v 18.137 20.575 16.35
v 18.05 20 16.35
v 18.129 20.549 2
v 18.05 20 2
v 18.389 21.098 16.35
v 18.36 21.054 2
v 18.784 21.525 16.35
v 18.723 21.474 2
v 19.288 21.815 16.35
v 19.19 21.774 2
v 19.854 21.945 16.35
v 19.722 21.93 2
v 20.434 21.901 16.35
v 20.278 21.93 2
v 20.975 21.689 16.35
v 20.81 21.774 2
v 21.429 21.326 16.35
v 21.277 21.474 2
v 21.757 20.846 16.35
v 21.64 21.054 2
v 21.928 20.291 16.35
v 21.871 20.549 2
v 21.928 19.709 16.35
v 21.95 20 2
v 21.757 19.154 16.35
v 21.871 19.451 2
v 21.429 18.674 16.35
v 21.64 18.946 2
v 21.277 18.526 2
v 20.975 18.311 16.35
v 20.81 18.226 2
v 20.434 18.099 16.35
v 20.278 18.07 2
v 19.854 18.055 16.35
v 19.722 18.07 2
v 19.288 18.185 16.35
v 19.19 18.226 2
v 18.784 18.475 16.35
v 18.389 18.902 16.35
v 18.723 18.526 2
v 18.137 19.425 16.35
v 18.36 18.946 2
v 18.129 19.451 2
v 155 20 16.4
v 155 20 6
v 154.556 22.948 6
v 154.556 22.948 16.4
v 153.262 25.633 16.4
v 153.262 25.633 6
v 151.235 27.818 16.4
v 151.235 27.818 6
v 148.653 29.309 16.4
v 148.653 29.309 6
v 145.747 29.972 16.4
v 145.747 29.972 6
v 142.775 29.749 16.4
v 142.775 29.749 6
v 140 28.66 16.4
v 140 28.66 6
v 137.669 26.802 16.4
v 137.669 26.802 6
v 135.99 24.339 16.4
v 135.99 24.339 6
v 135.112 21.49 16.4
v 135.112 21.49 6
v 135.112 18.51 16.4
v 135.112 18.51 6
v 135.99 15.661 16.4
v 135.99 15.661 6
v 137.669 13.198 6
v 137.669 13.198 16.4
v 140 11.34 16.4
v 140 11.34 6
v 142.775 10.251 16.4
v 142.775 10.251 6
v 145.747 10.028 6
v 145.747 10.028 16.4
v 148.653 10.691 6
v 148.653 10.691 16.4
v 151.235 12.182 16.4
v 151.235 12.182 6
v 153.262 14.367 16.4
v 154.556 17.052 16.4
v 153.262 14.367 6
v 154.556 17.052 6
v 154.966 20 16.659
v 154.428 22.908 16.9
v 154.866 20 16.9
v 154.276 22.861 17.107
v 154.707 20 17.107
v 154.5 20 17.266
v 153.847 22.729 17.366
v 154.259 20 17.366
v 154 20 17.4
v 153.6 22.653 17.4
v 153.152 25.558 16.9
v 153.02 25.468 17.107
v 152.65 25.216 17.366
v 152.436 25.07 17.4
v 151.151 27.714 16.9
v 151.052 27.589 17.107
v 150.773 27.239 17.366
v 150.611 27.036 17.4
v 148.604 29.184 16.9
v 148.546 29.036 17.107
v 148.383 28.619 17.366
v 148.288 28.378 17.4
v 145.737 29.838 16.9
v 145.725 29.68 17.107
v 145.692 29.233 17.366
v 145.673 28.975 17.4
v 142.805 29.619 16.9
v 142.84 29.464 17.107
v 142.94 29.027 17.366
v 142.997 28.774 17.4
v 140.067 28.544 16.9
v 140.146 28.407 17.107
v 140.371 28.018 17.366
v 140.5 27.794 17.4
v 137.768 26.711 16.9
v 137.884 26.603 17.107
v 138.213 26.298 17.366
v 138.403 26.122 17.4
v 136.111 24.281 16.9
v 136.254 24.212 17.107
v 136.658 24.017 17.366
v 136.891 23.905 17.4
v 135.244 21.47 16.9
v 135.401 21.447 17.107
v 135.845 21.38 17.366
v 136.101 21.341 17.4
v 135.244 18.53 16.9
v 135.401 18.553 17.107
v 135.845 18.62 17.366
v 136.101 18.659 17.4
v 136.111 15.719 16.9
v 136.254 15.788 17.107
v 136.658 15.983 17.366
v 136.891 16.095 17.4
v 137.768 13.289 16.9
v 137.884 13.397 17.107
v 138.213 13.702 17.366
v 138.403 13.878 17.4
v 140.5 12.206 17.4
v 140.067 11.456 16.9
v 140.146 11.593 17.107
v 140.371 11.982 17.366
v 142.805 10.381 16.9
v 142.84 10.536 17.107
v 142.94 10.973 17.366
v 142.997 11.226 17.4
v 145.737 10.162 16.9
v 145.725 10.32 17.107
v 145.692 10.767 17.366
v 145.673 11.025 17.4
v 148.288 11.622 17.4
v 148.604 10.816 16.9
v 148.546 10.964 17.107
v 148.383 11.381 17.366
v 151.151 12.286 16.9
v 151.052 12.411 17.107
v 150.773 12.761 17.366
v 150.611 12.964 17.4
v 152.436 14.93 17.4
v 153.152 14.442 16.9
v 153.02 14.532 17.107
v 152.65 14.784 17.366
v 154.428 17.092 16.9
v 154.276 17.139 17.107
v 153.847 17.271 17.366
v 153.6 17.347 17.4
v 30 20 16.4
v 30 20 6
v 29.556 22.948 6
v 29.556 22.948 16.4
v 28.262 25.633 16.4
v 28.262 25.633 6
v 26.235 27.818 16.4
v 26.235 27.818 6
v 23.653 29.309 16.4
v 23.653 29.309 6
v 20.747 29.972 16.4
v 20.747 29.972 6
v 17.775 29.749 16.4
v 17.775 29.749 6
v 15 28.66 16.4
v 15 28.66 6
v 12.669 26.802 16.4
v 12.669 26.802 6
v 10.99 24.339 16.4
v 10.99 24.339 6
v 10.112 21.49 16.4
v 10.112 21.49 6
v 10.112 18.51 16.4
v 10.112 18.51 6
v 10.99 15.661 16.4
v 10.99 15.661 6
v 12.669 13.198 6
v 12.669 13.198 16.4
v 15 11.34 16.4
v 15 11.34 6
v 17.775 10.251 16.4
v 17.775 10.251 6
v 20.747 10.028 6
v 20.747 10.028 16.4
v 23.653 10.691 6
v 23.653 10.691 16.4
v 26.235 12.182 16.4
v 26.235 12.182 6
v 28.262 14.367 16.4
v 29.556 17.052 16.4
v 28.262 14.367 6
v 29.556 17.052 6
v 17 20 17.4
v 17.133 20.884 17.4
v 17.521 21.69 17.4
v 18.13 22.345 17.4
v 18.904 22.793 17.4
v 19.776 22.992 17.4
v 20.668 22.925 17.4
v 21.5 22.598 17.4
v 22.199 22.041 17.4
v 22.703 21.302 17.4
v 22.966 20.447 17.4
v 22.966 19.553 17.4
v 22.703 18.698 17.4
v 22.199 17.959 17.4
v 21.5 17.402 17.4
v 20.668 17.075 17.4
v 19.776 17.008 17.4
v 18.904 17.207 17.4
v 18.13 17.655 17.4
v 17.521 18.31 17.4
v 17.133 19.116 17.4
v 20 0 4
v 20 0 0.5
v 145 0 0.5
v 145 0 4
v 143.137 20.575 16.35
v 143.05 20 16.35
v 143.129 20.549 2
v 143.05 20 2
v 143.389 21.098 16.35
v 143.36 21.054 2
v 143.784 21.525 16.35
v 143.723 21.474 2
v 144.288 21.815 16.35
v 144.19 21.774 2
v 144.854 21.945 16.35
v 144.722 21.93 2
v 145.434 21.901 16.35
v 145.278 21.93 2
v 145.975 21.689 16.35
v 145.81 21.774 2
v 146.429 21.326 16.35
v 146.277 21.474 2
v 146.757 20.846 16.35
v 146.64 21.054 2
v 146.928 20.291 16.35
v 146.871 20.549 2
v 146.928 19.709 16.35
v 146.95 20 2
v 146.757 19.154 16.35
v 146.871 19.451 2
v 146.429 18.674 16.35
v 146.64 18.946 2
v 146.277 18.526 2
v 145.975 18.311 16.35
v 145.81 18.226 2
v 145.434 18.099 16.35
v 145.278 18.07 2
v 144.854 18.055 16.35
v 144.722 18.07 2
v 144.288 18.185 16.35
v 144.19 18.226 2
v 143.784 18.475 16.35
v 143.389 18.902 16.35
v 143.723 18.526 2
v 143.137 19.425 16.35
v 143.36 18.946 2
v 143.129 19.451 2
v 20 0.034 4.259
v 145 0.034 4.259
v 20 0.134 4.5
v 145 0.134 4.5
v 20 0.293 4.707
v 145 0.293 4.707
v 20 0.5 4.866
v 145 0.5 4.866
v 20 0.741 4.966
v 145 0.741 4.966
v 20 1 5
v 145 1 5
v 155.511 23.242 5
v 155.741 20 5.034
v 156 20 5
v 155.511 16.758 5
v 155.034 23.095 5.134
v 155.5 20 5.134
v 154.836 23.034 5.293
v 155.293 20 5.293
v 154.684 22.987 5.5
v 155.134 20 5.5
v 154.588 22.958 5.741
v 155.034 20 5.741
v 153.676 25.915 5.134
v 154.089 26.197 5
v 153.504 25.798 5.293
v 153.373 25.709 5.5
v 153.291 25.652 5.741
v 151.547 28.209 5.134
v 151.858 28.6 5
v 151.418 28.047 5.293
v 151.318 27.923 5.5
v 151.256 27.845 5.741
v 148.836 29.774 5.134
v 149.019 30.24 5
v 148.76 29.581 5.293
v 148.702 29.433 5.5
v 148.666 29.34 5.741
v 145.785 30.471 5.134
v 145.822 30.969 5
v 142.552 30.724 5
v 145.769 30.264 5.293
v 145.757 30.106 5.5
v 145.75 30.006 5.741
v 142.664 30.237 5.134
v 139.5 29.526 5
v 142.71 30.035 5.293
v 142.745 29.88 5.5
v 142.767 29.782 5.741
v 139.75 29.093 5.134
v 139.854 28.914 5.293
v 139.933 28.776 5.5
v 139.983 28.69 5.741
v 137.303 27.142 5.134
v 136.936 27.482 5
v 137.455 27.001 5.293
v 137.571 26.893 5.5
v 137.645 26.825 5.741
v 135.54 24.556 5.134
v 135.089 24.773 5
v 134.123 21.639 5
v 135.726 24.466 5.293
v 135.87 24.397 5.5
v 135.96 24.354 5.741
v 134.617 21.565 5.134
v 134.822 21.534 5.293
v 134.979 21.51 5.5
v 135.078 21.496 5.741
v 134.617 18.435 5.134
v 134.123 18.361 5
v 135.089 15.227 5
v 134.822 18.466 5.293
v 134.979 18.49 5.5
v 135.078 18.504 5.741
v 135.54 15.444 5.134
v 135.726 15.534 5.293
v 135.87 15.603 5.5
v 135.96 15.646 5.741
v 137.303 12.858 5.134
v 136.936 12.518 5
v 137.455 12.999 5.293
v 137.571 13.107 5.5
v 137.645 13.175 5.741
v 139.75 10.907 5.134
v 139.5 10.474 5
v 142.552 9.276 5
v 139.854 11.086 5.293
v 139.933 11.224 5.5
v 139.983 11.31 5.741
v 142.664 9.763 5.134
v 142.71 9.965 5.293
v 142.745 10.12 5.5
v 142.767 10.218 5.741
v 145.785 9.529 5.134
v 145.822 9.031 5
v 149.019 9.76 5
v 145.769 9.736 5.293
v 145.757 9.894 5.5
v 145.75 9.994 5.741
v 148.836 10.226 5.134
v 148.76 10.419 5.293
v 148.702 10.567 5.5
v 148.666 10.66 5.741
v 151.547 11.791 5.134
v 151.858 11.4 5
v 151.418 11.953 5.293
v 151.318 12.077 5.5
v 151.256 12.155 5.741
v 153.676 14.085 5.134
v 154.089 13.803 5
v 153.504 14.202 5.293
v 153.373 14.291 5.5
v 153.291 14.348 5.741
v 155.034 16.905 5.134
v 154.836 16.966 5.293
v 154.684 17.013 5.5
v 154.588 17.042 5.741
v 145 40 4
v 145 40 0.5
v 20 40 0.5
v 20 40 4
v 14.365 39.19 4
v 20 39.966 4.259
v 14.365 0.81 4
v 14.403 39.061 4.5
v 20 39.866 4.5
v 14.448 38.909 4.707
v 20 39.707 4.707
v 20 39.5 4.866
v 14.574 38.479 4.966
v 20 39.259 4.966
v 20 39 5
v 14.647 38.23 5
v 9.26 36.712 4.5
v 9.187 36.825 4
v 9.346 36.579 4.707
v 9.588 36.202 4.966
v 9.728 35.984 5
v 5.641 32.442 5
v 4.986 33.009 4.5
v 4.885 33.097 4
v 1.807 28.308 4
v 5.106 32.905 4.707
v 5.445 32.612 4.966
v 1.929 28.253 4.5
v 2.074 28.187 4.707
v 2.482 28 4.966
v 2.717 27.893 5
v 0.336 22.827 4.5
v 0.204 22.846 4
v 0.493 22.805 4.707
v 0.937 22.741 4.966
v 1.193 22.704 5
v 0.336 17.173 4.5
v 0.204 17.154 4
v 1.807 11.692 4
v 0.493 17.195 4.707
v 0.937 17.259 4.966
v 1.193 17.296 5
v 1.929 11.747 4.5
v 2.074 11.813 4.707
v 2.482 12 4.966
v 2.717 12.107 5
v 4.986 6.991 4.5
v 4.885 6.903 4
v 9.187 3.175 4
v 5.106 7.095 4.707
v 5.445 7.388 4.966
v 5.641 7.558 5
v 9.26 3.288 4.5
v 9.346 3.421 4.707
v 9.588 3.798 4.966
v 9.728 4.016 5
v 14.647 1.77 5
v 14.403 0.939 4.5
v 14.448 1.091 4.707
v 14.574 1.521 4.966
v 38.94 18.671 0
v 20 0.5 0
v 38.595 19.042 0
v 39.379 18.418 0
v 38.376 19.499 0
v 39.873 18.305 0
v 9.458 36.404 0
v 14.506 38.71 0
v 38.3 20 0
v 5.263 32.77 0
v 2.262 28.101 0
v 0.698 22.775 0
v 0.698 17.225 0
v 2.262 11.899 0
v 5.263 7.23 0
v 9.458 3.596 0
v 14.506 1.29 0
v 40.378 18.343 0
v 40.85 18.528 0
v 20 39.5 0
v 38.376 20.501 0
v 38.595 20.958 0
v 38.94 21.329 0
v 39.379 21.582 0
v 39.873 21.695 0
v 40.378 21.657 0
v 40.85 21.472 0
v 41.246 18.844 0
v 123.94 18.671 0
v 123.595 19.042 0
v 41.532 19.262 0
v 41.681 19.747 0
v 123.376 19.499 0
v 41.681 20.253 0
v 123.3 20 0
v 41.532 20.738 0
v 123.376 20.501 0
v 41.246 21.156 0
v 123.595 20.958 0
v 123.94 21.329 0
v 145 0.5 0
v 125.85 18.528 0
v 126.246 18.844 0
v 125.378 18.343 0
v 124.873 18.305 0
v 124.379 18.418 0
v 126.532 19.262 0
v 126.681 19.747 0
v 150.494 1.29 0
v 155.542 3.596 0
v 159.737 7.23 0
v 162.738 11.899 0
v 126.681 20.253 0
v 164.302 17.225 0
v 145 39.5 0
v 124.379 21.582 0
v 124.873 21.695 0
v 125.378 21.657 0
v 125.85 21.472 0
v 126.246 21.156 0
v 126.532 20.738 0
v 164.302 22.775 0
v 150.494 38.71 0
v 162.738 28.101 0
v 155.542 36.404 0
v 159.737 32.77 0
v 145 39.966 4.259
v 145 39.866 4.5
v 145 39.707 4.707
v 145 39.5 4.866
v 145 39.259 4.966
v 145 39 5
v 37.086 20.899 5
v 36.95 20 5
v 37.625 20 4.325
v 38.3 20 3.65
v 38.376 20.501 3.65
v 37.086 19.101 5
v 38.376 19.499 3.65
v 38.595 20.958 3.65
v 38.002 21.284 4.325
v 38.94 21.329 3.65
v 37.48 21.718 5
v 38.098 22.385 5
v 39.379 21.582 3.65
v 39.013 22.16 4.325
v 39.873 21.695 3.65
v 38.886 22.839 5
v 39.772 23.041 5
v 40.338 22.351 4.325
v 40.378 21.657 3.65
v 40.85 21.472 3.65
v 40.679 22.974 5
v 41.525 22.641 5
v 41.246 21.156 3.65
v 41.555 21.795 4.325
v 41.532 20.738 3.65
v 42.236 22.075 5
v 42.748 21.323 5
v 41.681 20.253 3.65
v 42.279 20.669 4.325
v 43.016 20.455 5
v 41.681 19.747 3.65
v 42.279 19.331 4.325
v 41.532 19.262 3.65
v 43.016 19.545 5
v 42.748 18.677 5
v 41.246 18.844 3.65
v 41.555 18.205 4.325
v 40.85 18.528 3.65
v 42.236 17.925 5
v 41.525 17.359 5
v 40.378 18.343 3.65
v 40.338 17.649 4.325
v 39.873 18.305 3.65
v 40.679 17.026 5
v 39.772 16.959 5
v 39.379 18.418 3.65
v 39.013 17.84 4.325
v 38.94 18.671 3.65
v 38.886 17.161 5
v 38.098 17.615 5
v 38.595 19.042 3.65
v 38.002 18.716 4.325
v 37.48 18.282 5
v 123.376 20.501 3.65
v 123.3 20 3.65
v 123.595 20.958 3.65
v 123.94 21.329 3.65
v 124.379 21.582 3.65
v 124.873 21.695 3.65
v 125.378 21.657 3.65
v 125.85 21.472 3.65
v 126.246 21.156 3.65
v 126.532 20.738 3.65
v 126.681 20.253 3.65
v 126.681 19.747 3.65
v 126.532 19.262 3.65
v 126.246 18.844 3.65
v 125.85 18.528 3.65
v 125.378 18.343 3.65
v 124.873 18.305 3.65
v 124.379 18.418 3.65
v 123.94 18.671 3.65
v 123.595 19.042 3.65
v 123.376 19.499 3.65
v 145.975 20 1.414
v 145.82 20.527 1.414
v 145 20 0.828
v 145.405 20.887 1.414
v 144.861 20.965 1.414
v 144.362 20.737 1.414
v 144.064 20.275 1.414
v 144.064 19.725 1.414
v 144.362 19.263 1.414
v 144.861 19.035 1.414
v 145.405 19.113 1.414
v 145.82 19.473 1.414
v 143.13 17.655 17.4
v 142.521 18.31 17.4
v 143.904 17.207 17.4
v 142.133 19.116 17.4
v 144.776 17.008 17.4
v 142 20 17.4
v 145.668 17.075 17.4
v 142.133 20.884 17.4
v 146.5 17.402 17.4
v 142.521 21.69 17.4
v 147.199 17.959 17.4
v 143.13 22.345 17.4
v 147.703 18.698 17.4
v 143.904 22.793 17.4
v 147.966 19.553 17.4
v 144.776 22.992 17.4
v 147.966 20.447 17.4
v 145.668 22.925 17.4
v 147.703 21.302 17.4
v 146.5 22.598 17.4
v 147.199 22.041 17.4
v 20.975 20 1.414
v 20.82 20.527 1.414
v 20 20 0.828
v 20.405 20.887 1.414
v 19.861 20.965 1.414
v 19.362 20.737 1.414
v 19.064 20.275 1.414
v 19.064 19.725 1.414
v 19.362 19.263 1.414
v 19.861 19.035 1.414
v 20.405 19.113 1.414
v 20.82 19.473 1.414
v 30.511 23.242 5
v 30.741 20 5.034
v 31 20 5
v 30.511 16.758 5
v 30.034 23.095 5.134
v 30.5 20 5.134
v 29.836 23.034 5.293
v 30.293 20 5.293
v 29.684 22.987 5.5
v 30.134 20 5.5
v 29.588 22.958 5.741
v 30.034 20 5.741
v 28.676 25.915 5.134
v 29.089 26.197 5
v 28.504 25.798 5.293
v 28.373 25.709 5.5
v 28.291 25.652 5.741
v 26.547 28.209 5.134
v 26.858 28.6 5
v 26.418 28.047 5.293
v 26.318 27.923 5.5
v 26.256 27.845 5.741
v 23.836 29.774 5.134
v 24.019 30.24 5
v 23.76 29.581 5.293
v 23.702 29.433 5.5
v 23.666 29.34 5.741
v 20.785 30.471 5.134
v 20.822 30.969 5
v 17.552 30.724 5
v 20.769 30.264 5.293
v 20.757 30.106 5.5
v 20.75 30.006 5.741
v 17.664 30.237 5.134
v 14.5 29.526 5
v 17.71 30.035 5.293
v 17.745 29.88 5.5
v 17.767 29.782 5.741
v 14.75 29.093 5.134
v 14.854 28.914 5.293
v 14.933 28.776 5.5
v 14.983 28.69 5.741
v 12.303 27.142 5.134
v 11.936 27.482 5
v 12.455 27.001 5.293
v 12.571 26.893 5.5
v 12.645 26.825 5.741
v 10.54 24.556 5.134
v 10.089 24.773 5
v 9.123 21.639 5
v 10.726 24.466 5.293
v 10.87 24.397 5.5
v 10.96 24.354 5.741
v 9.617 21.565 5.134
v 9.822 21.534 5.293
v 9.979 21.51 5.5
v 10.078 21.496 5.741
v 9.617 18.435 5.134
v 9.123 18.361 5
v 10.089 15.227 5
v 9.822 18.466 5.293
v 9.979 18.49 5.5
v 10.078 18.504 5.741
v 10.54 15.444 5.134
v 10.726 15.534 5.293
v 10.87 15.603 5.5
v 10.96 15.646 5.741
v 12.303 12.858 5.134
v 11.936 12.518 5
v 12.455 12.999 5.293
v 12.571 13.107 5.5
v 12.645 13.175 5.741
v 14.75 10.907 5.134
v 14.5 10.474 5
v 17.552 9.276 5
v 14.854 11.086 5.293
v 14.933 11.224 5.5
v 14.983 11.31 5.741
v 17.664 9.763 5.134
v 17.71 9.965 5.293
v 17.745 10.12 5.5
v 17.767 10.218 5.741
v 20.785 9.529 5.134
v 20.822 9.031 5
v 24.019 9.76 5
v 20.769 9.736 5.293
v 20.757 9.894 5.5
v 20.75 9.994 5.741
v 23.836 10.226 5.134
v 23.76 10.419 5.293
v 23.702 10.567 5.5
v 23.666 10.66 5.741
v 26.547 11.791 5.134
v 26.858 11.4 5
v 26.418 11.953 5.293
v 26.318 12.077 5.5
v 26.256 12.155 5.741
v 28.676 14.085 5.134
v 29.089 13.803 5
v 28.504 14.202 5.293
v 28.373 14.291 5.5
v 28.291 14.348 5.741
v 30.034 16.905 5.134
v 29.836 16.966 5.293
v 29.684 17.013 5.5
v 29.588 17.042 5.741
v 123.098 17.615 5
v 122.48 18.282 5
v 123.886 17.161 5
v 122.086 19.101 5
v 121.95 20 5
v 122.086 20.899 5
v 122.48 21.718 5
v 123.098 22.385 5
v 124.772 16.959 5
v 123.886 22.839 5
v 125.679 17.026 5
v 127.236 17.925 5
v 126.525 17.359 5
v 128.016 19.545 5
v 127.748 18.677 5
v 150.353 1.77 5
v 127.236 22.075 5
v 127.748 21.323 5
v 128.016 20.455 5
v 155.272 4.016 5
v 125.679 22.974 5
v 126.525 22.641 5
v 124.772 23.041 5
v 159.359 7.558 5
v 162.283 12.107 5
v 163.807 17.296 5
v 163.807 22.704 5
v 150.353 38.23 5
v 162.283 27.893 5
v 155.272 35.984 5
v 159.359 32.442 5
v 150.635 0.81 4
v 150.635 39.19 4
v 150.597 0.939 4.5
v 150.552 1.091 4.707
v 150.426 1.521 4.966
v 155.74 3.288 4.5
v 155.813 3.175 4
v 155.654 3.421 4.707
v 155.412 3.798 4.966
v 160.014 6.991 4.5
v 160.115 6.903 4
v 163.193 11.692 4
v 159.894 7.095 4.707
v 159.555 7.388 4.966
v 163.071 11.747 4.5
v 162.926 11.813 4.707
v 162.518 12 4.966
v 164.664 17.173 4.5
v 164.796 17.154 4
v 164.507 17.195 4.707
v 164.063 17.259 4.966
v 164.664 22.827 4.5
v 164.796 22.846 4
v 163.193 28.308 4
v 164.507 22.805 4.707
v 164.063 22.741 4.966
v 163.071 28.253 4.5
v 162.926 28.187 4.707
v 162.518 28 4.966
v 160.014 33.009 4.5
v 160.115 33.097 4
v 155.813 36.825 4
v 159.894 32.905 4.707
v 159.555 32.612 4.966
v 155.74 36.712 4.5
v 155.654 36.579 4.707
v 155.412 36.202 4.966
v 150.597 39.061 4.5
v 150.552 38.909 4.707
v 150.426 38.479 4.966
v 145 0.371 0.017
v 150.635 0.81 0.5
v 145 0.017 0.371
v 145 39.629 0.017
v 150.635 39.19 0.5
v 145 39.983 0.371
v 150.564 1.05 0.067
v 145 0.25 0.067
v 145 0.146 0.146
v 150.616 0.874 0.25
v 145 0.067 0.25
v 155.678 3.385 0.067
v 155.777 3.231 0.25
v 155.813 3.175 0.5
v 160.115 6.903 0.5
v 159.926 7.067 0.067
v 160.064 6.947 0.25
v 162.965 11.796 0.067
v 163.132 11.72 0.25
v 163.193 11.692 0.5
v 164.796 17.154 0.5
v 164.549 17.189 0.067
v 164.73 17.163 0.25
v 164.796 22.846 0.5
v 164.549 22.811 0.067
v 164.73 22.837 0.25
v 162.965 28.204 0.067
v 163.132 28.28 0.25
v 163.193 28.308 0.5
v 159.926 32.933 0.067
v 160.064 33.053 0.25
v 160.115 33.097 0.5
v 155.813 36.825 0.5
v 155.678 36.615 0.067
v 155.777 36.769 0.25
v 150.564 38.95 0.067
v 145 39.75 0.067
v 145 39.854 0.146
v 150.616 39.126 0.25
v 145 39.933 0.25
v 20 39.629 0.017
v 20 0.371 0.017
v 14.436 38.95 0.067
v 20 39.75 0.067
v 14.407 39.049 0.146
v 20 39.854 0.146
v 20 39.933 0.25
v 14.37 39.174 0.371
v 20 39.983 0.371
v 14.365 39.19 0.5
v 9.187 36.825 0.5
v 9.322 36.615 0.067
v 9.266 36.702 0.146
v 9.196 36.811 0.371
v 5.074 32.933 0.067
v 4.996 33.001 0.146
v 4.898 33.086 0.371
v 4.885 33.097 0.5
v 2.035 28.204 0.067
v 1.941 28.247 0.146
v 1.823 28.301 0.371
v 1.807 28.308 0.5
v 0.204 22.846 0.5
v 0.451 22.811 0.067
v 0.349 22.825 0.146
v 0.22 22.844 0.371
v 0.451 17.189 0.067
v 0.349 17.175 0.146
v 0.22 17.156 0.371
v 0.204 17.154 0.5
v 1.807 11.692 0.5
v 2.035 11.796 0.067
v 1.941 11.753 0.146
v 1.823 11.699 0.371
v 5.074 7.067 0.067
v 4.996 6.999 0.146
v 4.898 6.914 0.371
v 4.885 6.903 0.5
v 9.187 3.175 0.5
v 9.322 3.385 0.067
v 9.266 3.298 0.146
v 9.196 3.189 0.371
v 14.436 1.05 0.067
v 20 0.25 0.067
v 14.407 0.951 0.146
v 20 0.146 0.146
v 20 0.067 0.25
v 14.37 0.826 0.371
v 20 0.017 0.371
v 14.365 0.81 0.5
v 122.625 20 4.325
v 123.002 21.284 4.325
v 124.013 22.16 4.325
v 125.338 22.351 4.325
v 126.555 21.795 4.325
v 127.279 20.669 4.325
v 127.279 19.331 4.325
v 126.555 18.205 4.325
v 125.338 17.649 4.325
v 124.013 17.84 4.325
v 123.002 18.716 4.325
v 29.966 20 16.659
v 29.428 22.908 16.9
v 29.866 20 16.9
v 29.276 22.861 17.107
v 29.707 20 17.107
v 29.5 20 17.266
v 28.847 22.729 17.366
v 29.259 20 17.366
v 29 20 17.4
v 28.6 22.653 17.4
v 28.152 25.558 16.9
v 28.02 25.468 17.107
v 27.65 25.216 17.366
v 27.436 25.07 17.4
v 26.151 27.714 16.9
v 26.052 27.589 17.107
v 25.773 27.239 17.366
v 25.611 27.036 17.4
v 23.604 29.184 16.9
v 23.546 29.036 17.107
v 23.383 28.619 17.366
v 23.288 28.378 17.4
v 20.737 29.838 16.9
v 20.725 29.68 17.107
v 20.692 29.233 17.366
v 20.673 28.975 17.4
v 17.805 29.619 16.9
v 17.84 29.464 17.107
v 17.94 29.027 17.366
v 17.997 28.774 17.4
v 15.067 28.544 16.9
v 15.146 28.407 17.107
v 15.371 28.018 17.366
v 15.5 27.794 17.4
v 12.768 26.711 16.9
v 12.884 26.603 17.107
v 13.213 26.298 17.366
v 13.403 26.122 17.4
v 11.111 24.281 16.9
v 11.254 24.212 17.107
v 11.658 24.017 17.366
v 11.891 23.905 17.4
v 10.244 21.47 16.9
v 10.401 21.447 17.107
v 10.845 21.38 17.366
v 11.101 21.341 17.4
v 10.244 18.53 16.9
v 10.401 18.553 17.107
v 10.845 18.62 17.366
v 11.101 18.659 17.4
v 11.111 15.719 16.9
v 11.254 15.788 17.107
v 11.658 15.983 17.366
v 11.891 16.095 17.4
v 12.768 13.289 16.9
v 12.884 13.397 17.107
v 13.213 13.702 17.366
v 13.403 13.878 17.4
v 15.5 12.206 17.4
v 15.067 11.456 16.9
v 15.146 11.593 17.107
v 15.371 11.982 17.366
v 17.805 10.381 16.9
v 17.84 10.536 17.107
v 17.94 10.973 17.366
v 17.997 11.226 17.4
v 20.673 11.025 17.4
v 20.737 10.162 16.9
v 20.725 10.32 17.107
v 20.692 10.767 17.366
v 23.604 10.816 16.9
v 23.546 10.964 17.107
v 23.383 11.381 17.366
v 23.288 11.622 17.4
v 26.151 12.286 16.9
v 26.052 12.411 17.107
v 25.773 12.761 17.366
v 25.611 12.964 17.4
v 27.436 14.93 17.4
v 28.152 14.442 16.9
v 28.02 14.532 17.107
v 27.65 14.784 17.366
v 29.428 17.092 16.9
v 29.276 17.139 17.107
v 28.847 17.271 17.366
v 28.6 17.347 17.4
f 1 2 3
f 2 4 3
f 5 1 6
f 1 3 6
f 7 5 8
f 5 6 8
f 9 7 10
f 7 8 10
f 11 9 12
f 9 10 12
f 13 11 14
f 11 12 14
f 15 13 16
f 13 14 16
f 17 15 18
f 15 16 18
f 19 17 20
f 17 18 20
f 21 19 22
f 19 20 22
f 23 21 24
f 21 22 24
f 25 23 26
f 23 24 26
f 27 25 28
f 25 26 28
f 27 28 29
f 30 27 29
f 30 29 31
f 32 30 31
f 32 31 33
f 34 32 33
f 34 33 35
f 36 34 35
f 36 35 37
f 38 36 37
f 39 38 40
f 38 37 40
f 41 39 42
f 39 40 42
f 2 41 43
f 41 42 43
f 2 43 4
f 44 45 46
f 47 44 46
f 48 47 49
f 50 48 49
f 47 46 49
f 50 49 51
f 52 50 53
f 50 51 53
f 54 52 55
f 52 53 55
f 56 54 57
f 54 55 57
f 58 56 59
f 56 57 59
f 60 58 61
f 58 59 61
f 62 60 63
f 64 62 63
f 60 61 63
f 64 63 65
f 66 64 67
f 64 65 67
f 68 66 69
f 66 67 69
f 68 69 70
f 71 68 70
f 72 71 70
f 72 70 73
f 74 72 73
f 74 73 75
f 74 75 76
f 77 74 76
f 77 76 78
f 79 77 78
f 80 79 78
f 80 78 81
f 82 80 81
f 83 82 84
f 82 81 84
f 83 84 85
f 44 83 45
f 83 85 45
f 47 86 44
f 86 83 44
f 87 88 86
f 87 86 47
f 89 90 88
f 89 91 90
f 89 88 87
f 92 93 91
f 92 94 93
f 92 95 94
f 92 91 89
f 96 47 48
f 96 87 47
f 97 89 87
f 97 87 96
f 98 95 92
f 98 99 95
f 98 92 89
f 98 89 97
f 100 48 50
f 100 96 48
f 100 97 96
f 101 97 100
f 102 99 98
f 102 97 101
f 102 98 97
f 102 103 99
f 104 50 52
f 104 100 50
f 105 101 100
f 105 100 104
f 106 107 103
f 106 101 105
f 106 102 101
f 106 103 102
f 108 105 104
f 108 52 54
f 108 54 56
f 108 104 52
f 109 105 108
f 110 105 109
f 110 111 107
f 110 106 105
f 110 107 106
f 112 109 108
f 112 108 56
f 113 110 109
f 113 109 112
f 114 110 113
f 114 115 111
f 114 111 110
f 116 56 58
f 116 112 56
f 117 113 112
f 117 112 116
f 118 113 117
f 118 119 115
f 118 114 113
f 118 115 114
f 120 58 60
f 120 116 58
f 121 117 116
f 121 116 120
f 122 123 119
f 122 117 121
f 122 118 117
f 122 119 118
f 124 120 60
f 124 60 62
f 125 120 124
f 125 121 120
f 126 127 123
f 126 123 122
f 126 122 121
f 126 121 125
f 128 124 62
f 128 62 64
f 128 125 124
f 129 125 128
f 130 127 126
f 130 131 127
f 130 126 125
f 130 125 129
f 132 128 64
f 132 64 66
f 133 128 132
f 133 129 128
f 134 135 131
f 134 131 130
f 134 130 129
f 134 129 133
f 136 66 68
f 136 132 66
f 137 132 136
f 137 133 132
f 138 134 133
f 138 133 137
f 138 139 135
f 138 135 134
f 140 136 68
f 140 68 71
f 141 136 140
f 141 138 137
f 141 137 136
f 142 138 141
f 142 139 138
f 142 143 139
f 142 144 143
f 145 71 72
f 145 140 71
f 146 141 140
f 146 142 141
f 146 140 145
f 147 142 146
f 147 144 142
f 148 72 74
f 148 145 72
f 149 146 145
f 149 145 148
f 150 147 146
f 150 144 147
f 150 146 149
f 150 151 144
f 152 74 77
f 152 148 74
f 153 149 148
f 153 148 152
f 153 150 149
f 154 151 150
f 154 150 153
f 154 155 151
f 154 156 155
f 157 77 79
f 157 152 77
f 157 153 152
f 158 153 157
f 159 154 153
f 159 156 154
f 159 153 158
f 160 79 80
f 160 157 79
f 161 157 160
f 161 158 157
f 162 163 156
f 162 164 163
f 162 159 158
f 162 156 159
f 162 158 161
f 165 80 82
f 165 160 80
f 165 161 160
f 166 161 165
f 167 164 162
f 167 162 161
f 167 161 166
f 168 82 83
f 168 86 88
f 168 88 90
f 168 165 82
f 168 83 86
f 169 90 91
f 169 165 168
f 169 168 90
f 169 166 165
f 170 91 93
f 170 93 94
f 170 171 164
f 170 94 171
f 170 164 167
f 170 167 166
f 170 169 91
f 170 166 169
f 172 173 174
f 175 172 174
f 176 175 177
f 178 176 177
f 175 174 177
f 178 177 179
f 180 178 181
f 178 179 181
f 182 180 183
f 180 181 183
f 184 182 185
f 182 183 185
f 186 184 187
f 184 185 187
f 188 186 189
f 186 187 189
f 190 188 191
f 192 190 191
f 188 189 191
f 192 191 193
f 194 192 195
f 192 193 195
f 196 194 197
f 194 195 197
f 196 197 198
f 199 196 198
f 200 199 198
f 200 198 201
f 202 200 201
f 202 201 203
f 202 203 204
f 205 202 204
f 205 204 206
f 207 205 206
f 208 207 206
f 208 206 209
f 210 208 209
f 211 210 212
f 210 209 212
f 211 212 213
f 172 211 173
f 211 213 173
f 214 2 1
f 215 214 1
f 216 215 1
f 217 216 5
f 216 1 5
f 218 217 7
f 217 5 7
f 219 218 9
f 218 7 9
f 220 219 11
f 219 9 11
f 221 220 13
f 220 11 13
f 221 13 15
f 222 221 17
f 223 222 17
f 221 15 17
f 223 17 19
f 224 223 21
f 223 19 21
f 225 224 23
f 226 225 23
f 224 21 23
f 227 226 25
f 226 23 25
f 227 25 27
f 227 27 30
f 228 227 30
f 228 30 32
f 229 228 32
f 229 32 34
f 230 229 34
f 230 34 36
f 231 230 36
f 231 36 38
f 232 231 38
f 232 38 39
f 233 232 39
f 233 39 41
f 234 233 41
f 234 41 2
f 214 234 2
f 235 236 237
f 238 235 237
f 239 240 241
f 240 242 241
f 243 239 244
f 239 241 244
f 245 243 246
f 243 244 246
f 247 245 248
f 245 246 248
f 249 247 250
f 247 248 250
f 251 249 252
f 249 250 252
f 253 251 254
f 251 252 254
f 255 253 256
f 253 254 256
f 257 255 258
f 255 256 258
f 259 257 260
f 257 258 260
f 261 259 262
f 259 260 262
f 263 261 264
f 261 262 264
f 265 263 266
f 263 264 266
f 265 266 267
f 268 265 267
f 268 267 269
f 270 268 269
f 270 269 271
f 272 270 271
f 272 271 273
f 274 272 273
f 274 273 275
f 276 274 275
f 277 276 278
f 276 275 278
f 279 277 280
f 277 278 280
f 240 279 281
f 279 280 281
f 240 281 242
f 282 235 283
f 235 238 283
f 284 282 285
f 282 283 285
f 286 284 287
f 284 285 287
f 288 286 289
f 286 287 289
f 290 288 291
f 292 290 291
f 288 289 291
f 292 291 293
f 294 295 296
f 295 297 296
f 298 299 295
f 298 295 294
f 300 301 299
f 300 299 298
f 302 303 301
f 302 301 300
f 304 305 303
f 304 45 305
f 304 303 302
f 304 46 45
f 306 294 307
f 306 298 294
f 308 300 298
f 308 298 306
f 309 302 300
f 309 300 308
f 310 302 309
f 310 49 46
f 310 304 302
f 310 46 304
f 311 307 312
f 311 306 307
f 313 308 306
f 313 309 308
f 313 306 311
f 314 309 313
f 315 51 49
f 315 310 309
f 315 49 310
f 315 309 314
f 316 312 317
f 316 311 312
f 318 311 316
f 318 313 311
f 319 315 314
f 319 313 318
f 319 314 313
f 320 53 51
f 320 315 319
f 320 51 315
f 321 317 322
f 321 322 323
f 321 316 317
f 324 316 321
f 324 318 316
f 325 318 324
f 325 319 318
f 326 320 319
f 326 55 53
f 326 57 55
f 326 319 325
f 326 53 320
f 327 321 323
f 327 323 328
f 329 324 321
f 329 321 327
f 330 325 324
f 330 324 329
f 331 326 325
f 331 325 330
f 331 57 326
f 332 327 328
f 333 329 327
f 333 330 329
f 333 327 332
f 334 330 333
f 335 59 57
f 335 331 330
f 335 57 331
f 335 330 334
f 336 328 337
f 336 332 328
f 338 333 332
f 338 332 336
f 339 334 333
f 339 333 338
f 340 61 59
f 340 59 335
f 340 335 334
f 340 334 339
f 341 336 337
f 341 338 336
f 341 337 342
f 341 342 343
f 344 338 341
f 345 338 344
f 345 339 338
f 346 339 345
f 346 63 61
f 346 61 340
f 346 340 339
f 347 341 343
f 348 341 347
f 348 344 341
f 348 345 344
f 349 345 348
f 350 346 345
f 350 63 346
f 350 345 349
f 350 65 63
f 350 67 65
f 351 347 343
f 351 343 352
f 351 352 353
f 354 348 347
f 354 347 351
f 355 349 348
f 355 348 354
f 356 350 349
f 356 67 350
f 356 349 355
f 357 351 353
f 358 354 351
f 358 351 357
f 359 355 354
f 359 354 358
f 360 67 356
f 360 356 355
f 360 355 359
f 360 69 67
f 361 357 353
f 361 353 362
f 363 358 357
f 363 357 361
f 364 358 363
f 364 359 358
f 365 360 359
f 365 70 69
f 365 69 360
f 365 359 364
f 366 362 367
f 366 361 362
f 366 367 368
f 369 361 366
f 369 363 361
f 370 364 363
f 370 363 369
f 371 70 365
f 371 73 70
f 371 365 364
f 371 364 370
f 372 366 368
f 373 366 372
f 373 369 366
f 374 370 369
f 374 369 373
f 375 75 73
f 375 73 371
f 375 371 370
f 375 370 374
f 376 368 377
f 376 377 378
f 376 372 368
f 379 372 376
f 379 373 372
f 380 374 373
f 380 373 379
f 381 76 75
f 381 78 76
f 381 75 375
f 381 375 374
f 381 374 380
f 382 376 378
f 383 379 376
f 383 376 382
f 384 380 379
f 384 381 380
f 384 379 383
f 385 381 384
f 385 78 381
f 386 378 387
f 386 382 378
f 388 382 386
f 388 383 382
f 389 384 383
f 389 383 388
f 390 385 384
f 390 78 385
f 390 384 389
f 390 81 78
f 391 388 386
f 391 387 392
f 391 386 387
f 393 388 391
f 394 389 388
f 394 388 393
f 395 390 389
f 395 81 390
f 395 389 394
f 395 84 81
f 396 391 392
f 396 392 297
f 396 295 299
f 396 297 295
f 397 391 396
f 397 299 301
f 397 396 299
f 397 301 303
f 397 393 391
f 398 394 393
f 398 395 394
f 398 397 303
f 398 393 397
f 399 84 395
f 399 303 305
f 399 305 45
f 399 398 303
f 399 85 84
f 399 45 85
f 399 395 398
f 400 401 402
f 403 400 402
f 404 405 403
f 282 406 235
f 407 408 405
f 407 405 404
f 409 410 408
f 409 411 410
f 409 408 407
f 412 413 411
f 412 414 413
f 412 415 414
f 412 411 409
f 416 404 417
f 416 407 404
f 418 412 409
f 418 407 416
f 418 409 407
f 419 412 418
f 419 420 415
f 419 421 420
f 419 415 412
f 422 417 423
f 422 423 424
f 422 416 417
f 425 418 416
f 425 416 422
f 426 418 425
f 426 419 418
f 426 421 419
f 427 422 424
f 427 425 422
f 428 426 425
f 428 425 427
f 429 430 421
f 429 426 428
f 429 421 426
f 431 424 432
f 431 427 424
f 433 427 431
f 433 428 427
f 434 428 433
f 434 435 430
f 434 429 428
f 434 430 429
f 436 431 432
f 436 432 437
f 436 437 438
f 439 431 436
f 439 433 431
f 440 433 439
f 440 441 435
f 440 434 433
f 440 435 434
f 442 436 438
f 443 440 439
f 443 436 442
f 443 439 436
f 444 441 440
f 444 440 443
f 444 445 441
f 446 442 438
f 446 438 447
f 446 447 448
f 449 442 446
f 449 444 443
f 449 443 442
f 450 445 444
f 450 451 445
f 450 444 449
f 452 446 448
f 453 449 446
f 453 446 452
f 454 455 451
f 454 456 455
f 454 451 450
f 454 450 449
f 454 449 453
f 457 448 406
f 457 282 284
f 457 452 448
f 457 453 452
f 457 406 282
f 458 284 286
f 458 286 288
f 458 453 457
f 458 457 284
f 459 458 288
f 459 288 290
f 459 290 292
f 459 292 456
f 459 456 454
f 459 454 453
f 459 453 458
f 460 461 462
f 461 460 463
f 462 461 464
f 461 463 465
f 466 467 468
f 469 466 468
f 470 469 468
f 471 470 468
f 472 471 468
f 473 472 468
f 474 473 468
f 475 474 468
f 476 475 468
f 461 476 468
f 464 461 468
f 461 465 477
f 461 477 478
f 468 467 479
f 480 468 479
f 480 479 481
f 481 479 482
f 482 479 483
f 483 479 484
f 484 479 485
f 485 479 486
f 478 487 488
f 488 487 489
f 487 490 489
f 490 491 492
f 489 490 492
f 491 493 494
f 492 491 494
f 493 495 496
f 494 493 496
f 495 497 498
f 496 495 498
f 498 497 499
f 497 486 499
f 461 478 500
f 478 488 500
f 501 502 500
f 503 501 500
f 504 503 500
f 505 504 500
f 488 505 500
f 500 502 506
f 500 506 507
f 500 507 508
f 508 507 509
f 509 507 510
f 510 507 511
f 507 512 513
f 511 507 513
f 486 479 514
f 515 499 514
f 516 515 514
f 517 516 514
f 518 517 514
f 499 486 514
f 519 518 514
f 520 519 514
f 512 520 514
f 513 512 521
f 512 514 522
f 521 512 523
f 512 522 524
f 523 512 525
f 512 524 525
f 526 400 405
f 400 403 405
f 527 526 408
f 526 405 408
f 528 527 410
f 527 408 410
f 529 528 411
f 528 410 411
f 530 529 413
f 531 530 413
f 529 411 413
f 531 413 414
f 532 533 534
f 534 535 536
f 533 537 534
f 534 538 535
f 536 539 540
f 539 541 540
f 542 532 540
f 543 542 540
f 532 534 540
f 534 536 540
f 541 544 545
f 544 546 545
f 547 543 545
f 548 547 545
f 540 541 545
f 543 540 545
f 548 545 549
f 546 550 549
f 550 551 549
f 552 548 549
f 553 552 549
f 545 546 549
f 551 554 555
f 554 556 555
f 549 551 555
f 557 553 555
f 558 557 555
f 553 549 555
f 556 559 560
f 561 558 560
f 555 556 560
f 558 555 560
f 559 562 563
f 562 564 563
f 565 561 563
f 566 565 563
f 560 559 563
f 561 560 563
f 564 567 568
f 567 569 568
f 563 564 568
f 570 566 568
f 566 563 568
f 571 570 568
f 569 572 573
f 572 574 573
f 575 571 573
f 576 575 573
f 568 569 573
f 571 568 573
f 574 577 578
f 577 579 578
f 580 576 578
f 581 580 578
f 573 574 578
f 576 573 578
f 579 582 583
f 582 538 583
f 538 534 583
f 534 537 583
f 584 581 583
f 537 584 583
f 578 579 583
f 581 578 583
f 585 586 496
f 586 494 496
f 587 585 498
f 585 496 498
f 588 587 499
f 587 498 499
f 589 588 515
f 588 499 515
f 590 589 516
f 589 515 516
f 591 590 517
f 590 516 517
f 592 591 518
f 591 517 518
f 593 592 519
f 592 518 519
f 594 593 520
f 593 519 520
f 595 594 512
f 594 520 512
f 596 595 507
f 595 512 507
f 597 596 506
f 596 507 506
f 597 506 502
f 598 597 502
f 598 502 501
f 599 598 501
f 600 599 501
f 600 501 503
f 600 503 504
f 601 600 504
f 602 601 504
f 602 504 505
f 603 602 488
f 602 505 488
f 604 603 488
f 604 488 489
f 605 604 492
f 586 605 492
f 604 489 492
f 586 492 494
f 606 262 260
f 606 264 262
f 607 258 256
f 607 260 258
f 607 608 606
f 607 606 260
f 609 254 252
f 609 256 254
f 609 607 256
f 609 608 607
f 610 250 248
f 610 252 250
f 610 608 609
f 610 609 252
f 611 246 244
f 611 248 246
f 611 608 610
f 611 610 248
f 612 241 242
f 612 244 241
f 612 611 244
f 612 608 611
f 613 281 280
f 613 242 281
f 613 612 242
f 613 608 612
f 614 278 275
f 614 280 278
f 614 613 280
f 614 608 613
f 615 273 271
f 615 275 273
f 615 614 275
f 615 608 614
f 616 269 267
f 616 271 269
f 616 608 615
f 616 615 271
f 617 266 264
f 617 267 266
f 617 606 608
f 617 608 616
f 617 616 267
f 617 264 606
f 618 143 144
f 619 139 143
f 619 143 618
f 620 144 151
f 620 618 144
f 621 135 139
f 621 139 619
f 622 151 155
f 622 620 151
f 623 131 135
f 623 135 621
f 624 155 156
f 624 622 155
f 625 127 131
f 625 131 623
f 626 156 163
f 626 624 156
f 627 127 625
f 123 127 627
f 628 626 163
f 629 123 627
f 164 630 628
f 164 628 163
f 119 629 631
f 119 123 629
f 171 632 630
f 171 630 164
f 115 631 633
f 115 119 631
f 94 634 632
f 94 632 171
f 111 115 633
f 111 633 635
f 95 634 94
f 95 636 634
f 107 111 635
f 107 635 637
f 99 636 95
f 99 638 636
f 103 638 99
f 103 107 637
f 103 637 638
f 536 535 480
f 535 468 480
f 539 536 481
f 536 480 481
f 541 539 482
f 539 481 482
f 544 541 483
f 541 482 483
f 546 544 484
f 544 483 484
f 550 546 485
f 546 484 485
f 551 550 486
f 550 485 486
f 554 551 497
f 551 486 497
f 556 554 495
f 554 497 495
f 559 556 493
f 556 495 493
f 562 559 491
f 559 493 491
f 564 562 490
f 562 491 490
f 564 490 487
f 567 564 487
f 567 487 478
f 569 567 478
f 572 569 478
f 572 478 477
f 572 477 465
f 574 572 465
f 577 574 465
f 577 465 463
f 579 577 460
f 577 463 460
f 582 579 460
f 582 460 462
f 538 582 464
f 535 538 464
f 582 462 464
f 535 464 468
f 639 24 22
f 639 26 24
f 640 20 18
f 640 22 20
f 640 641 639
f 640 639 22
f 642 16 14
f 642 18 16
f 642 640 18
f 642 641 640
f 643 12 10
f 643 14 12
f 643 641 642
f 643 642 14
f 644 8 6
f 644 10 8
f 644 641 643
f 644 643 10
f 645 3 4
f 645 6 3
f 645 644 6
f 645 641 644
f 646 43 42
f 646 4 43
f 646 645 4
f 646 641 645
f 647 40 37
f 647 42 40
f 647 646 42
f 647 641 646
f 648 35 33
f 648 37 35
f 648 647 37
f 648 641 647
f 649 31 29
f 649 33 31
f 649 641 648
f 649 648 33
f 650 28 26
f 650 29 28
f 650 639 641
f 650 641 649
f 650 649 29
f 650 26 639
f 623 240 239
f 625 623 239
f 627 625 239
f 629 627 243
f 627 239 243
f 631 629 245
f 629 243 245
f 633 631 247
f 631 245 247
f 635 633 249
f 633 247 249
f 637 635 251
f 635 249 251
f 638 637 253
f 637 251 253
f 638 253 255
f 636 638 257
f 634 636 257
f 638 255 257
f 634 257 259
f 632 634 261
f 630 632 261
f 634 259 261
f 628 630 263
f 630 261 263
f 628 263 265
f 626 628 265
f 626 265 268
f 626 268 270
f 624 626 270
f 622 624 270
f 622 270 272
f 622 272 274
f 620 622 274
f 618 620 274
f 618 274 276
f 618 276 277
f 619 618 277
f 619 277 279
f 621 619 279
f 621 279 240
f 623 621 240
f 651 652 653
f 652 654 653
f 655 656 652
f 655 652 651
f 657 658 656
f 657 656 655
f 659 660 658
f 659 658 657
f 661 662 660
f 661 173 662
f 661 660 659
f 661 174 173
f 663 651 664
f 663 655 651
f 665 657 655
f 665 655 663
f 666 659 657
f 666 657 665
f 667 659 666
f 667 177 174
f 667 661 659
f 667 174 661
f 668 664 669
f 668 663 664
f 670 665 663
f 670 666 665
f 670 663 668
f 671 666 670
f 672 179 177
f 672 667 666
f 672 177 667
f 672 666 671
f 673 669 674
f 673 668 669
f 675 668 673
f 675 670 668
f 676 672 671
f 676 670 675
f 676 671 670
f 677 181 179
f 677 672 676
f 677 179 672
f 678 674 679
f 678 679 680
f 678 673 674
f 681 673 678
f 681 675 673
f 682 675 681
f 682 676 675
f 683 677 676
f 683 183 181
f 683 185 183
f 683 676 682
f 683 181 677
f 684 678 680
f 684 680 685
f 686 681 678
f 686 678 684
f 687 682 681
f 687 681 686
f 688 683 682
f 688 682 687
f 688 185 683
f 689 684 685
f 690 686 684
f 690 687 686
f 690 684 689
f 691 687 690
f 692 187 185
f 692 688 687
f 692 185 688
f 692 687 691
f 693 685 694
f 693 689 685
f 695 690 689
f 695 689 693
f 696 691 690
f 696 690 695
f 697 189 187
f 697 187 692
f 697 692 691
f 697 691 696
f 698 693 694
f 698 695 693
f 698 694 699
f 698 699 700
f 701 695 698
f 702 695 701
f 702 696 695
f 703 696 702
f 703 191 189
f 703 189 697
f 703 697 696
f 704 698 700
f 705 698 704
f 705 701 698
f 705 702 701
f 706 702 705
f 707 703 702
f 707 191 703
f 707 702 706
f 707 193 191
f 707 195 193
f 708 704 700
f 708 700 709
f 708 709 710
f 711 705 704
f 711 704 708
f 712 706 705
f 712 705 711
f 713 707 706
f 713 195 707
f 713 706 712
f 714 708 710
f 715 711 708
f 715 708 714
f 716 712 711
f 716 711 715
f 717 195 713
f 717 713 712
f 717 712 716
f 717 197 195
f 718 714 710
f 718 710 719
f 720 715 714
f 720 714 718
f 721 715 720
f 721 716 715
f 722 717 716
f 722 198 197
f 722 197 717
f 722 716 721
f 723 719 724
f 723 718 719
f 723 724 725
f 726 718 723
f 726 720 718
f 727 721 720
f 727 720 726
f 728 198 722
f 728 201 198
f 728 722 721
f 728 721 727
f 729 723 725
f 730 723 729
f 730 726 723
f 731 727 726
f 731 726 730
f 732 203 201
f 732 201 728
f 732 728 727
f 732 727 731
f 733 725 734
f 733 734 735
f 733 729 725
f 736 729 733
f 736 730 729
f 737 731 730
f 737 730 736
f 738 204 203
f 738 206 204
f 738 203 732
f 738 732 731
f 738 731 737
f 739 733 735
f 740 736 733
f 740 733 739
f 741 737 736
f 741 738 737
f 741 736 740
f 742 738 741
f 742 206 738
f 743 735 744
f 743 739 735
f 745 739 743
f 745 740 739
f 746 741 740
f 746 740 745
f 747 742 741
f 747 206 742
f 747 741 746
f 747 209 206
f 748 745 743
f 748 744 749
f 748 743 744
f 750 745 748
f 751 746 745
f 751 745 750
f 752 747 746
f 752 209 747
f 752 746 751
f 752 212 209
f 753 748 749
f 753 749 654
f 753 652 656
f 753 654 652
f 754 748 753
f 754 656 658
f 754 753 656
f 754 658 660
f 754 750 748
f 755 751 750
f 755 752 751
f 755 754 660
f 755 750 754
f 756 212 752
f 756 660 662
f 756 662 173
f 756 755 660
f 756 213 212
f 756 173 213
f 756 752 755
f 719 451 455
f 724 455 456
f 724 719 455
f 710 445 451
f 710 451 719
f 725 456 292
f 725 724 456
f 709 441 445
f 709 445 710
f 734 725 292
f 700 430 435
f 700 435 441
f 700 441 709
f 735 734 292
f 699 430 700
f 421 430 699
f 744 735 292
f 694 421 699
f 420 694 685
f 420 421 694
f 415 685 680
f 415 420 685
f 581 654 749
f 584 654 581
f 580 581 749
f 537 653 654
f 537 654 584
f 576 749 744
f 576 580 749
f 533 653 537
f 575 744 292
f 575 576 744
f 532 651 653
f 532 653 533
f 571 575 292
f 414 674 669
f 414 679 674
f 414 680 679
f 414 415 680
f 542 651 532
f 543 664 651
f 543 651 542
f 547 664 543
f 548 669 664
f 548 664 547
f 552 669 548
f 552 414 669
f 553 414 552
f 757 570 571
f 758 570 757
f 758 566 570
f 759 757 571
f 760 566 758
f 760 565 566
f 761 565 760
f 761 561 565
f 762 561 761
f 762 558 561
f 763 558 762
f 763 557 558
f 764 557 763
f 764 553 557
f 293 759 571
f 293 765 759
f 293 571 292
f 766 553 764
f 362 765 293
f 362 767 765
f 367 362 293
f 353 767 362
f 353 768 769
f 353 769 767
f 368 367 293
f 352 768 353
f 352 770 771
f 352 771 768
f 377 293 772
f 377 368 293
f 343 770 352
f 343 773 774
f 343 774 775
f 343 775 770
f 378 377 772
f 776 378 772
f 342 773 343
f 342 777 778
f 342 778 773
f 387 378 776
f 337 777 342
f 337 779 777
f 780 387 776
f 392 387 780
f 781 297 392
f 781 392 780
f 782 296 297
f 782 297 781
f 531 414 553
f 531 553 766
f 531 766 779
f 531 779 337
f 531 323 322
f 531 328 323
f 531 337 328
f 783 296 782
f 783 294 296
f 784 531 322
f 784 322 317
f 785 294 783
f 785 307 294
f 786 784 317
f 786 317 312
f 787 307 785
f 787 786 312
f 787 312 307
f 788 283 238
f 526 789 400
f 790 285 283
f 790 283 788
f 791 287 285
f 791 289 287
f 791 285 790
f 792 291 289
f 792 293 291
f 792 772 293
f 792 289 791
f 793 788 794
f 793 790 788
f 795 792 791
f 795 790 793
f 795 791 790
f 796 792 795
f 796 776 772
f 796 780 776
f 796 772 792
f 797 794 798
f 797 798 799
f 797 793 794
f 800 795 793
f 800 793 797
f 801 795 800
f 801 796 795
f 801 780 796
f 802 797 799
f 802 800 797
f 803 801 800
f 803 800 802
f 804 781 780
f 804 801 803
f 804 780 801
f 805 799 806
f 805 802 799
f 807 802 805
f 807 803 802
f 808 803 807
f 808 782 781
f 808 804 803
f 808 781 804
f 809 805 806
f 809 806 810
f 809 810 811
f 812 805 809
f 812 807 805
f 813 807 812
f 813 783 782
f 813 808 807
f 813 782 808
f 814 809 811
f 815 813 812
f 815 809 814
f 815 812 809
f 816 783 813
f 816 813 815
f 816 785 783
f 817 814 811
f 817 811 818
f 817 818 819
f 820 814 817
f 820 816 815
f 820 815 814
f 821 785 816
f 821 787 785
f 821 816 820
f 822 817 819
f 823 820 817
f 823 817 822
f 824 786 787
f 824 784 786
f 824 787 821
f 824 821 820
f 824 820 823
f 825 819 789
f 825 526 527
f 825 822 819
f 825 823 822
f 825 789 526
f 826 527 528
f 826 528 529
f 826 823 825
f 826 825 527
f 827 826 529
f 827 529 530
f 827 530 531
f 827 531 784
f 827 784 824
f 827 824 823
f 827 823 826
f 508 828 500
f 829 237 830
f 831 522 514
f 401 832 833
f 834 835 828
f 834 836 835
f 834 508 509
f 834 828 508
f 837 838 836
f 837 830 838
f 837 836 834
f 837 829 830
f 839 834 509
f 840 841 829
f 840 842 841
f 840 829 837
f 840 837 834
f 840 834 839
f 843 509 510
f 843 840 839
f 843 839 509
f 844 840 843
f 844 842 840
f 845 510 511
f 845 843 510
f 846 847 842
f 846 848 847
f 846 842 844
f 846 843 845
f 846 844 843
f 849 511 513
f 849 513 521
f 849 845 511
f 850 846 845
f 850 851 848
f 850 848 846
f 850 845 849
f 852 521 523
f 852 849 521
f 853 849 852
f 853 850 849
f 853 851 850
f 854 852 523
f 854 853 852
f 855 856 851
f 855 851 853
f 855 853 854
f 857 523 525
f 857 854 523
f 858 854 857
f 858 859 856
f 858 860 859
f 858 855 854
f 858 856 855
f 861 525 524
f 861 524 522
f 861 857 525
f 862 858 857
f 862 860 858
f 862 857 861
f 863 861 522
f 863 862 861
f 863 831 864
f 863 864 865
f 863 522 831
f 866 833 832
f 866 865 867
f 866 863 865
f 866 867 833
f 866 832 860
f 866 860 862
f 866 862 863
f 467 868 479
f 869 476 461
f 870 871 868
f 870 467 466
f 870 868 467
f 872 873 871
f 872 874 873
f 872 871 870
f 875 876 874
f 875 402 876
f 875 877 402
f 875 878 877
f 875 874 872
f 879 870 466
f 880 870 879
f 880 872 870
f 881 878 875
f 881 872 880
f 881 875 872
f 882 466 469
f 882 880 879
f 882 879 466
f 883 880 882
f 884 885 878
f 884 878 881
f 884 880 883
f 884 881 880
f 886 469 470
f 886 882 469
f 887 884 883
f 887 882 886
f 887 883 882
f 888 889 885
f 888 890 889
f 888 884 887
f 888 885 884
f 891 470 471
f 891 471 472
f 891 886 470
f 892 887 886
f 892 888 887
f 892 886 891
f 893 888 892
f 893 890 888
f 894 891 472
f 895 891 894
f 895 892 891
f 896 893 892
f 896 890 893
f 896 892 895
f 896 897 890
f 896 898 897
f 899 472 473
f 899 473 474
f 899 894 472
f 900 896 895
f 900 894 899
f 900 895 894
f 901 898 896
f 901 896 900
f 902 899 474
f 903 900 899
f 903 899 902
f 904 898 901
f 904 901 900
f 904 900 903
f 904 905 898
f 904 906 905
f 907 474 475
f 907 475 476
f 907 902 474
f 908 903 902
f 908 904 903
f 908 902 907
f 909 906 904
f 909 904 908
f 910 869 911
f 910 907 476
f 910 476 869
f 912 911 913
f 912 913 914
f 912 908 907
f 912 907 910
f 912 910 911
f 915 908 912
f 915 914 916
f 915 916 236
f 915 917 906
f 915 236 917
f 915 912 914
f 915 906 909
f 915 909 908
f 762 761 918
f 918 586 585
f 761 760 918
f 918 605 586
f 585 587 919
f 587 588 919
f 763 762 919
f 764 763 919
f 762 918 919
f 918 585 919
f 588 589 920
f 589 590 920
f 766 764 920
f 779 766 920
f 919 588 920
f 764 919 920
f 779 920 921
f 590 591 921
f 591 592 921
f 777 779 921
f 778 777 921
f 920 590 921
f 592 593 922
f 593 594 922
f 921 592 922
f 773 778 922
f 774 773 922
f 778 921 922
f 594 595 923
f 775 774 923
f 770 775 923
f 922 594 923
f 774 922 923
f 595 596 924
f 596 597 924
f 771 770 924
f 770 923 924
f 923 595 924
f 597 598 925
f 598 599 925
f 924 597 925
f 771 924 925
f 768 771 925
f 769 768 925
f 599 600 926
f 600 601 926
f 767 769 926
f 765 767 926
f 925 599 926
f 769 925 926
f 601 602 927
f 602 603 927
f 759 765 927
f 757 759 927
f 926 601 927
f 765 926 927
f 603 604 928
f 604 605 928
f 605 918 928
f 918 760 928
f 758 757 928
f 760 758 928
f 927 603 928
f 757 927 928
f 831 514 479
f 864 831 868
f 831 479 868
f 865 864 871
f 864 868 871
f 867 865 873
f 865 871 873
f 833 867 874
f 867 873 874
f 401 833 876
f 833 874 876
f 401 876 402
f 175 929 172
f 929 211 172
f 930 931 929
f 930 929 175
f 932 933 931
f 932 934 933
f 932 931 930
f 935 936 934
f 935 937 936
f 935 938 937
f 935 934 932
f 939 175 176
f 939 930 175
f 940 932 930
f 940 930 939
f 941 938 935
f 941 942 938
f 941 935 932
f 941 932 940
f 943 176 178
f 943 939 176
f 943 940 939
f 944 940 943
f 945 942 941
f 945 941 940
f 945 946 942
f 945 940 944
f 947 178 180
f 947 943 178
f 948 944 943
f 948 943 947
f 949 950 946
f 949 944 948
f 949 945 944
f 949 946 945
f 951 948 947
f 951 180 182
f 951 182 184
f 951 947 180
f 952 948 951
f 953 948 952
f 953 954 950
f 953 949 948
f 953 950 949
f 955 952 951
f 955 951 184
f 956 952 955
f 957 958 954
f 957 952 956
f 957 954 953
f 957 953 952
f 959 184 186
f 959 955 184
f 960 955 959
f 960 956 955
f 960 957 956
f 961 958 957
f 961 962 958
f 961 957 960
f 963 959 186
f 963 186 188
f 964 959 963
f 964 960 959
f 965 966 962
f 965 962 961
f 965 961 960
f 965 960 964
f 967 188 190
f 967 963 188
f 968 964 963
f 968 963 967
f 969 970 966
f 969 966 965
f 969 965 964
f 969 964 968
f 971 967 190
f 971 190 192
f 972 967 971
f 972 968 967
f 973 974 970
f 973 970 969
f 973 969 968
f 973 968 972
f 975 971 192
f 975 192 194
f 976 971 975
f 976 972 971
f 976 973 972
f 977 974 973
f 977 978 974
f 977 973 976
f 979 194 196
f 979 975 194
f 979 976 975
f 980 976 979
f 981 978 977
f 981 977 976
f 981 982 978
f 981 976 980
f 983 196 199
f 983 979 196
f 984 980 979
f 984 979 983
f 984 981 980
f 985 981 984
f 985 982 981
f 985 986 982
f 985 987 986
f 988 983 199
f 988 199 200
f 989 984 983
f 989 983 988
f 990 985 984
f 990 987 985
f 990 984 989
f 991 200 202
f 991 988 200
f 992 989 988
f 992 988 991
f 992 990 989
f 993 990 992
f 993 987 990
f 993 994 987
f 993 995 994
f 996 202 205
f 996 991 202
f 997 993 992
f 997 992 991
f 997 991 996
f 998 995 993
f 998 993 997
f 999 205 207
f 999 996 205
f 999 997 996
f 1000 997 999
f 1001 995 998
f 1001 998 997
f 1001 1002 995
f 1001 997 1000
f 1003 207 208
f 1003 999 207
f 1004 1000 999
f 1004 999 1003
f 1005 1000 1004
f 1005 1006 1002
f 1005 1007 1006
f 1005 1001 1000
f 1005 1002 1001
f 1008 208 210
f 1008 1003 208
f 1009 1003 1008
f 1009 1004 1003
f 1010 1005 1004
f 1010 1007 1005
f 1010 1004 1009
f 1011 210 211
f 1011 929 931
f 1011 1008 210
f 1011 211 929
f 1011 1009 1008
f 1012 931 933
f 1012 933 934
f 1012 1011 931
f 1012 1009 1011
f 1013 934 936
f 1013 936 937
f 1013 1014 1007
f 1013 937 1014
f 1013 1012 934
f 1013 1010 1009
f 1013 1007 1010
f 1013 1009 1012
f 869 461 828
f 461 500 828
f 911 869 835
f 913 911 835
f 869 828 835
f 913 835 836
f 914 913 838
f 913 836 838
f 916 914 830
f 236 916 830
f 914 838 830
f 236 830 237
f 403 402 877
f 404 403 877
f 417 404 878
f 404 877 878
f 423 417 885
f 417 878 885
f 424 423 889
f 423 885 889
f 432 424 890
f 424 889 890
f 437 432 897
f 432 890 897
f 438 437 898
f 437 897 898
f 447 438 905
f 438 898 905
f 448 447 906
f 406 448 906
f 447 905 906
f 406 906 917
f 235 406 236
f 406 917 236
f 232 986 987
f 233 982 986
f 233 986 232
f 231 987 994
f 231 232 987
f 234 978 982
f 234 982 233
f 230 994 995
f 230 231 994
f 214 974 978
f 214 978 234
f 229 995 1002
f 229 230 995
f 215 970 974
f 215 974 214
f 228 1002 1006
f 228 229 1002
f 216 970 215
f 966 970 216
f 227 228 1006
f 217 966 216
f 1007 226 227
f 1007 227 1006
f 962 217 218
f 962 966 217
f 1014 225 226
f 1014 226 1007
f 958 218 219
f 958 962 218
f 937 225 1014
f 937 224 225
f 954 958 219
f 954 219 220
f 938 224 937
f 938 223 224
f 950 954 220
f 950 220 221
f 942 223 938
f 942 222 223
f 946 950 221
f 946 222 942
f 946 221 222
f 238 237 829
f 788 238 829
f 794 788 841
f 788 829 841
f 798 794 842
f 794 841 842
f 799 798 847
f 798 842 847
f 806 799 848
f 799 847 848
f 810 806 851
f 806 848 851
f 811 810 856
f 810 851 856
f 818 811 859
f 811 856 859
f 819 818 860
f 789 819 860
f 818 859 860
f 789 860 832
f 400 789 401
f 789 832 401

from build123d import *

# Parameters (mm, degrees)
PAD_DEPTH           = 5
SKETCH001_R         = 10
PAD001_DEPTH        = 12.4
HOLE_D              = 3.9
HOLE_DEPTH          = 15.4
HOLE_CSINK_D        = 6
HOLE_CSINK_ANGLE    = 90
HOLE_TIPS_R         = 1.95
FILLET_R            = 1
FILLET001_R         = 0.5
HOLE001_D           = 3.4
HOLE001_CSINK_D     = 6.1
HOLE001_CSINK_ANGLE = 90


with BuildPart() as part:
    # Sketch → Pad (new body)
    with BuildSketch(Plane.XY):
        with BuildLine():
            ThreePointArc((20, 40), (0, 20), (20, 0))
            Line((20, 0), (145, 0))
            ThreePointArc((145, 0), (165, 20), (145, 40))
            Line((145, 40), (20, 40))
        make_face()
    extrude(amount=PAD_DEPTH)

    # Sketch001 → Pad001 (join)
    with BuildSketch(Plane.XY.offset(5)):
        with Locations((20, 20)):
            Circle(SKETCH001_R)
        with Locations((145, 20)):
            Circle(SKETCH001_R)
    extrude(amount=PAD001_DEPTH)

    # Hole
    with Locations(Plane.XY.offset(17.4)):
        with Locations((20, 20), (145, 20)):
            CounterSinkHole(HOLE_D / 2, HOLE_CSINK_D / 2, depth=HOLE_DEPTH, counter_sink_angle=HOLE_CSINK_ANGLE)

    # Hole tips → Hole tip 1 section 0
    with BuildSketch(Plane.XY.offset(2), mode=Mode.PRIVATE) as hole_tip_1_s0:
        with Locations((20, 20)):
            Circle(HOLE_TIPS_R)
    loft([hole_tip_1_s0.sketch, Vertex(20, 20, 0.828322)], mode=Mode.SUBTRACT)

    # Hole tips → Hole tip 2 section 0
    with BuildSketch(Plane.XY.offset(2), mode=Mode.PRIVATE) as hole_tip_2_s0:
        with Locations((145, 20)):
            Circle(HOLE_TIPS_R)
    loft([hole_tip_2_s0.sketch, Vertex(145, 20, 0.828322)], mode=Mode.SUBTRACT)

    # Fillet
    fillet_edges = [part.edges().sort_by_distance(p)[0] for p in [
        (10, 20, 17.4),
        (135, 20, 5),
        (0, 20, 5),
        (82.5, 0, 5),
        (82.5, 40, 5),
        (165, 20, 5),
        (10, 20, 5),
        (135, 20, 17.4),
    ]]
    fillet(fillet_edges, radius=FILLET_R)

    # Fillet001
    fillet001_edges = [part.edges().sort_by_distance(p)[0] for p in [
        (165, 20, 0),
        (82.5, 0, 0),
        (82.5, 40, 0),
        (0, 20, 0),
    ]]
    fillet(fillet001_edges, radius=FILLET001_R)

    # Hole001 (through all)
    with Locations(Plane.XY.offset(5)):
        with Locations((40, 20), (125, 20)):
            CounterSinkHole(HOLE001_D / 2, HOLE001_CSINK_D / 2, counter_sink_angle=HOLE001_CSINK_ANGLE)


solid = part.part
